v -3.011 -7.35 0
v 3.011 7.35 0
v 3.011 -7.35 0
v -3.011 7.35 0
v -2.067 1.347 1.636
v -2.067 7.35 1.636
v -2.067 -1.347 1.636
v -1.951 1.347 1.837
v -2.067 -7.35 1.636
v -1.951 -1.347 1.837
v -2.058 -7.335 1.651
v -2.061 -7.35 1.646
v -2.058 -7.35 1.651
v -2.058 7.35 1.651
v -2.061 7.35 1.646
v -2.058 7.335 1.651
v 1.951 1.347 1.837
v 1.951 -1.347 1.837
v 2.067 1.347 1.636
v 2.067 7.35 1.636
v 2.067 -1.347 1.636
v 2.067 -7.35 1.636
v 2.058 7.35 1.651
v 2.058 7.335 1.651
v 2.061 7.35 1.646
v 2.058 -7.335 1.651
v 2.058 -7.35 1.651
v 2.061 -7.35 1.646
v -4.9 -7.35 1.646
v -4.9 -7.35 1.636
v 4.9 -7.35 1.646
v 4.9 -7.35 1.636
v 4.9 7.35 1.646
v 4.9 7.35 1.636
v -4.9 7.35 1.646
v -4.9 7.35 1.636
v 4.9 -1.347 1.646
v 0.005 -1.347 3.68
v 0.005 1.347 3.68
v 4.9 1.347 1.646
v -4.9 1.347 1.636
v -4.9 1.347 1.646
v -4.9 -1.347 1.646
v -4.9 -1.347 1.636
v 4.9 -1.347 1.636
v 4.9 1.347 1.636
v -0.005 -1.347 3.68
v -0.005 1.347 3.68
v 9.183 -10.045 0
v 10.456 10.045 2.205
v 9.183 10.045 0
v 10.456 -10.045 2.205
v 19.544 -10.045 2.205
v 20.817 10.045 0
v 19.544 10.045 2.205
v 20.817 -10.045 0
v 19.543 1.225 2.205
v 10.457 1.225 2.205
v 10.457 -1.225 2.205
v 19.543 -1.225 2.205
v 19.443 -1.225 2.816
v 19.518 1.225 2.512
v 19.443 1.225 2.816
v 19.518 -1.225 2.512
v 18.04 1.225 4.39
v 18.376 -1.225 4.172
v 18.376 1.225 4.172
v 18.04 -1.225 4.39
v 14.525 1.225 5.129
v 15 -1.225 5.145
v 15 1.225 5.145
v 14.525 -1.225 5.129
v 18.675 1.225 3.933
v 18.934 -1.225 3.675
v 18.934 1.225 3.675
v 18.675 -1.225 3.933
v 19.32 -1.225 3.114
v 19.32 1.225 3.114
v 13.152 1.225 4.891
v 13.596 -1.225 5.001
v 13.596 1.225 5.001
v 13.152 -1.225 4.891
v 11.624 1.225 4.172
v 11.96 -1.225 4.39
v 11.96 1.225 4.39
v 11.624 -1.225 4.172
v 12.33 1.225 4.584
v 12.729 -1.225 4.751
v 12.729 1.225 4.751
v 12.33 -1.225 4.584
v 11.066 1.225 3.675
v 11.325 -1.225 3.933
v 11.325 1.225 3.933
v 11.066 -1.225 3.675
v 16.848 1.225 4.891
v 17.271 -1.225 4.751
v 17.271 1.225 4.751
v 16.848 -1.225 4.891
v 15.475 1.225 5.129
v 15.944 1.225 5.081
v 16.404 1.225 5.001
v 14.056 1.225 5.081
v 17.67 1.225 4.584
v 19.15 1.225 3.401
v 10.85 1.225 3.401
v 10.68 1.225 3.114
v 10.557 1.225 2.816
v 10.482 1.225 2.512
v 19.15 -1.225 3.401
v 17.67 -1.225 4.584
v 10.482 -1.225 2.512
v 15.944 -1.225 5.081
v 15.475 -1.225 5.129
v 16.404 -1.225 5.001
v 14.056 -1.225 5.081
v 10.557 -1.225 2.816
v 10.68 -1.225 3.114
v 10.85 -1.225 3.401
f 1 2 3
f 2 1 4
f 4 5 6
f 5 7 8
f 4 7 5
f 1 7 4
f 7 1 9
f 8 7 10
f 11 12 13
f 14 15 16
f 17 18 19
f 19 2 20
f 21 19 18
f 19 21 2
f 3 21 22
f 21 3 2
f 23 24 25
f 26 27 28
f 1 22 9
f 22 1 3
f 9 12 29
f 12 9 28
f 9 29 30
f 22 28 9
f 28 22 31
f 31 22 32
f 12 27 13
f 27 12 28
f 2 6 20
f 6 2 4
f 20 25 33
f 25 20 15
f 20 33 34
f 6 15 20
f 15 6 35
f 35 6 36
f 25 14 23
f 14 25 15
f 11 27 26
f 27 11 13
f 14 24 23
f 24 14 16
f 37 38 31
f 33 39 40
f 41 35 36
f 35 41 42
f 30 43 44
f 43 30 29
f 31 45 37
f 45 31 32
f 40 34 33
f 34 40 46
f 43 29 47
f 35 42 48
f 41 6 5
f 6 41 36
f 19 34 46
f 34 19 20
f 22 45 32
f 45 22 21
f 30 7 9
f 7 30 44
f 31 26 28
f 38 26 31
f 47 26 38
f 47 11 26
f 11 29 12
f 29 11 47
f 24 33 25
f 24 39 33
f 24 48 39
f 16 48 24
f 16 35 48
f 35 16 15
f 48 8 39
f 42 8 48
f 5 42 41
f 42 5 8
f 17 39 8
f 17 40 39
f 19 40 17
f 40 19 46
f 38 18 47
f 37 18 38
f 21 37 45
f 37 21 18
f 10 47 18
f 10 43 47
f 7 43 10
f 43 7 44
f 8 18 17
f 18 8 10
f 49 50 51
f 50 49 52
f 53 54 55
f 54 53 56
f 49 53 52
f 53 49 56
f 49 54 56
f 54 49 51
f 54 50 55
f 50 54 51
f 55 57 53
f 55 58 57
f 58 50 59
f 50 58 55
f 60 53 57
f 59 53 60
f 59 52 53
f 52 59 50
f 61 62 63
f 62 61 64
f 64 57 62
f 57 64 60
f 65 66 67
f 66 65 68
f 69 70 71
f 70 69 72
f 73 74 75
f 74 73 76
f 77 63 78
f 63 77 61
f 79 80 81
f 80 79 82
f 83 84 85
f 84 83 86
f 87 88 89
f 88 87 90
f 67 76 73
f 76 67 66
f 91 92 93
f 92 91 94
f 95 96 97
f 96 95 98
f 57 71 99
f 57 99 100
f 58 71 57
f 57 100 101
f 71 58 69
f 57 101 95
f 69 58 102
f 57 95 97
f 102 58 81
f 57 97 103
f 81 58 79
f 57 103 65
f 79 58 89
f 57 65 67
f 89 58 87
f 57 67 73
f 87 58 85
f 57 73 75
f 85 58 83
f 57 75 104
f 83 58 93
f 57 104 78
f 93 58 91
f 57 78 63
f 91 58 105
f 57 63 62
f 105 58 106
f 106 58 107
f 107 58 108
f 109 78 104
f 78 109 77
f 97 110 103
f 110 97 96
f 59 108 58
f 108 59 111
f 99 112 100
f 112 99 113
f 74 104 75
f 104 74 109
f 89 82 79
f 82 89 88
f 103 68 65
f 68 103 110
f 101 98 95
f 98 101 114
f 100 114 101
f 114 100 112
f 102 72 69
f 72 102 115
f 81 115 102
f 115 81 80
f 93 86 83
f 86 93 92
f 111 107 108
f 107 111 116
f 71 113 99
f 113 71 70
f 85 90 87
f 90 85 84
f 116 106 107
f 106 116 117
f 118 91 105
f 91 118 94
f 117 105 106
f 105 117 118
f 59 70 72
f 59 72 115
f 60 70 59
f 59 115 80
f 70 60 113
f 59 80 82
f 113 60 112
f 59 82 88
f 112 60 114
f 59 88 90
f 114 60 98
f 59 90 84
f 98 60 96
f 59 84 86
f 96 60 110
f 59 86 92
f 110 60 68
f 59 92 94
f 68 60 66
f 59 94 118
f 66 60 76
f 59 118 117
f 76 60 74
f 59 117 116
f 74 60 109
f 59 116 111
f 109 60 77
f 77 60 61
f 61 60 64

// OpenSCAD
in = 24.5;
slop = .2;


front_site();

translate([15,0,0]) rear_site();


//this is the trapezoid with the half-moon top.
module rear_site(){
    base_w = .483*in - slop;
    base_rad = base_w/sqrt(3);
    base_len = .82*in;
    
    base_height = .09*in;
    
    top_height = .21*in-base_height;
    top_rad = .379/2*in-slop/2;
    top_w = .1*in;
    
    union(){
        difference(){
            translate([0,0,base_rad*cos(60)]) rotate([90,0,0]) rotate([0,0,-30]) cylinder(r=base_rad, h=base_len, center=true, $fn=3);
            translate([0,0,base_rad*cos(60)+base_height]) rotate([90,0,0]) rotate([0,0,-30]) cylinder(r=base_rad, h=base_len+1, center=true, $fn=3);
        }
            
        intersection(){
            translate([0,0,base_height]) scale([1,1,(top_height/top_rad)]) rotate([90,0,0]) cylinder(r=top_rad, h=top_w, center=true, $fn=60);
            translate([0,0,base_rad*cos(60)+base_height-.1]) rotate([90,0,0]) rotate([0,0,-30]) cylinder(r=base_rad, h=base_len+1, center=true, $fn=3);
        }
    }
}

module front_site(){
    base_w = .374*in - slop-.06*in*2;
    base_rad = base_w/sqrt(3);
    base_len = .6*in;
    
    base_cutoff=.075*in;
    
    echo(base_w/25.4);
    
    base_height = .067*in;
    
    top_height = .15*in;
    top_width = .4*in;
    
    peak_width=.110*in;
    
    union(){
        //base
        difference(){
            translate([0,0,base_rad*cos(60)]) rotate([90,0,0]) rotate([0,0,-30]) cylinder(r=base_rad, h=base_len, center=true, $fn=3);
            translate([0,0,base_rad*cos(60)+base_height+.01]) rotate([90,0,0]) rotate([0,0,-30]) cylinder(r=base_rad, h=base_len+1, center=true, $fn=3);
        }
         
        //top
        difference(){
            hull(){
                translate([0,0,base_height]) cube([top_width,base_len,.01], center=true);
                translate([0,0,top_height]) cube([.01,peak_width,.01], center=true);
            }
            
            translate([0,0,base_height-.1]) cube([base_len, peak_width,10], center=true);
        }
        
        //raised center base
        difference(){
            translate([0,0,base_rad*cos(60)]) rotate([90,0,0]) rotate([0,0,-30]) cylinder(r=base_rad, h=peak_width+.1, center=true, $fn=3);
            translate([0,0,base_rad*cos(60)+base_cutoff]) rotate([90,0,0]) rotate([0,0,-30]) cylinder(r=base_rad, h=base_len+1, center=true, $fn=3);
        }
    }
}
